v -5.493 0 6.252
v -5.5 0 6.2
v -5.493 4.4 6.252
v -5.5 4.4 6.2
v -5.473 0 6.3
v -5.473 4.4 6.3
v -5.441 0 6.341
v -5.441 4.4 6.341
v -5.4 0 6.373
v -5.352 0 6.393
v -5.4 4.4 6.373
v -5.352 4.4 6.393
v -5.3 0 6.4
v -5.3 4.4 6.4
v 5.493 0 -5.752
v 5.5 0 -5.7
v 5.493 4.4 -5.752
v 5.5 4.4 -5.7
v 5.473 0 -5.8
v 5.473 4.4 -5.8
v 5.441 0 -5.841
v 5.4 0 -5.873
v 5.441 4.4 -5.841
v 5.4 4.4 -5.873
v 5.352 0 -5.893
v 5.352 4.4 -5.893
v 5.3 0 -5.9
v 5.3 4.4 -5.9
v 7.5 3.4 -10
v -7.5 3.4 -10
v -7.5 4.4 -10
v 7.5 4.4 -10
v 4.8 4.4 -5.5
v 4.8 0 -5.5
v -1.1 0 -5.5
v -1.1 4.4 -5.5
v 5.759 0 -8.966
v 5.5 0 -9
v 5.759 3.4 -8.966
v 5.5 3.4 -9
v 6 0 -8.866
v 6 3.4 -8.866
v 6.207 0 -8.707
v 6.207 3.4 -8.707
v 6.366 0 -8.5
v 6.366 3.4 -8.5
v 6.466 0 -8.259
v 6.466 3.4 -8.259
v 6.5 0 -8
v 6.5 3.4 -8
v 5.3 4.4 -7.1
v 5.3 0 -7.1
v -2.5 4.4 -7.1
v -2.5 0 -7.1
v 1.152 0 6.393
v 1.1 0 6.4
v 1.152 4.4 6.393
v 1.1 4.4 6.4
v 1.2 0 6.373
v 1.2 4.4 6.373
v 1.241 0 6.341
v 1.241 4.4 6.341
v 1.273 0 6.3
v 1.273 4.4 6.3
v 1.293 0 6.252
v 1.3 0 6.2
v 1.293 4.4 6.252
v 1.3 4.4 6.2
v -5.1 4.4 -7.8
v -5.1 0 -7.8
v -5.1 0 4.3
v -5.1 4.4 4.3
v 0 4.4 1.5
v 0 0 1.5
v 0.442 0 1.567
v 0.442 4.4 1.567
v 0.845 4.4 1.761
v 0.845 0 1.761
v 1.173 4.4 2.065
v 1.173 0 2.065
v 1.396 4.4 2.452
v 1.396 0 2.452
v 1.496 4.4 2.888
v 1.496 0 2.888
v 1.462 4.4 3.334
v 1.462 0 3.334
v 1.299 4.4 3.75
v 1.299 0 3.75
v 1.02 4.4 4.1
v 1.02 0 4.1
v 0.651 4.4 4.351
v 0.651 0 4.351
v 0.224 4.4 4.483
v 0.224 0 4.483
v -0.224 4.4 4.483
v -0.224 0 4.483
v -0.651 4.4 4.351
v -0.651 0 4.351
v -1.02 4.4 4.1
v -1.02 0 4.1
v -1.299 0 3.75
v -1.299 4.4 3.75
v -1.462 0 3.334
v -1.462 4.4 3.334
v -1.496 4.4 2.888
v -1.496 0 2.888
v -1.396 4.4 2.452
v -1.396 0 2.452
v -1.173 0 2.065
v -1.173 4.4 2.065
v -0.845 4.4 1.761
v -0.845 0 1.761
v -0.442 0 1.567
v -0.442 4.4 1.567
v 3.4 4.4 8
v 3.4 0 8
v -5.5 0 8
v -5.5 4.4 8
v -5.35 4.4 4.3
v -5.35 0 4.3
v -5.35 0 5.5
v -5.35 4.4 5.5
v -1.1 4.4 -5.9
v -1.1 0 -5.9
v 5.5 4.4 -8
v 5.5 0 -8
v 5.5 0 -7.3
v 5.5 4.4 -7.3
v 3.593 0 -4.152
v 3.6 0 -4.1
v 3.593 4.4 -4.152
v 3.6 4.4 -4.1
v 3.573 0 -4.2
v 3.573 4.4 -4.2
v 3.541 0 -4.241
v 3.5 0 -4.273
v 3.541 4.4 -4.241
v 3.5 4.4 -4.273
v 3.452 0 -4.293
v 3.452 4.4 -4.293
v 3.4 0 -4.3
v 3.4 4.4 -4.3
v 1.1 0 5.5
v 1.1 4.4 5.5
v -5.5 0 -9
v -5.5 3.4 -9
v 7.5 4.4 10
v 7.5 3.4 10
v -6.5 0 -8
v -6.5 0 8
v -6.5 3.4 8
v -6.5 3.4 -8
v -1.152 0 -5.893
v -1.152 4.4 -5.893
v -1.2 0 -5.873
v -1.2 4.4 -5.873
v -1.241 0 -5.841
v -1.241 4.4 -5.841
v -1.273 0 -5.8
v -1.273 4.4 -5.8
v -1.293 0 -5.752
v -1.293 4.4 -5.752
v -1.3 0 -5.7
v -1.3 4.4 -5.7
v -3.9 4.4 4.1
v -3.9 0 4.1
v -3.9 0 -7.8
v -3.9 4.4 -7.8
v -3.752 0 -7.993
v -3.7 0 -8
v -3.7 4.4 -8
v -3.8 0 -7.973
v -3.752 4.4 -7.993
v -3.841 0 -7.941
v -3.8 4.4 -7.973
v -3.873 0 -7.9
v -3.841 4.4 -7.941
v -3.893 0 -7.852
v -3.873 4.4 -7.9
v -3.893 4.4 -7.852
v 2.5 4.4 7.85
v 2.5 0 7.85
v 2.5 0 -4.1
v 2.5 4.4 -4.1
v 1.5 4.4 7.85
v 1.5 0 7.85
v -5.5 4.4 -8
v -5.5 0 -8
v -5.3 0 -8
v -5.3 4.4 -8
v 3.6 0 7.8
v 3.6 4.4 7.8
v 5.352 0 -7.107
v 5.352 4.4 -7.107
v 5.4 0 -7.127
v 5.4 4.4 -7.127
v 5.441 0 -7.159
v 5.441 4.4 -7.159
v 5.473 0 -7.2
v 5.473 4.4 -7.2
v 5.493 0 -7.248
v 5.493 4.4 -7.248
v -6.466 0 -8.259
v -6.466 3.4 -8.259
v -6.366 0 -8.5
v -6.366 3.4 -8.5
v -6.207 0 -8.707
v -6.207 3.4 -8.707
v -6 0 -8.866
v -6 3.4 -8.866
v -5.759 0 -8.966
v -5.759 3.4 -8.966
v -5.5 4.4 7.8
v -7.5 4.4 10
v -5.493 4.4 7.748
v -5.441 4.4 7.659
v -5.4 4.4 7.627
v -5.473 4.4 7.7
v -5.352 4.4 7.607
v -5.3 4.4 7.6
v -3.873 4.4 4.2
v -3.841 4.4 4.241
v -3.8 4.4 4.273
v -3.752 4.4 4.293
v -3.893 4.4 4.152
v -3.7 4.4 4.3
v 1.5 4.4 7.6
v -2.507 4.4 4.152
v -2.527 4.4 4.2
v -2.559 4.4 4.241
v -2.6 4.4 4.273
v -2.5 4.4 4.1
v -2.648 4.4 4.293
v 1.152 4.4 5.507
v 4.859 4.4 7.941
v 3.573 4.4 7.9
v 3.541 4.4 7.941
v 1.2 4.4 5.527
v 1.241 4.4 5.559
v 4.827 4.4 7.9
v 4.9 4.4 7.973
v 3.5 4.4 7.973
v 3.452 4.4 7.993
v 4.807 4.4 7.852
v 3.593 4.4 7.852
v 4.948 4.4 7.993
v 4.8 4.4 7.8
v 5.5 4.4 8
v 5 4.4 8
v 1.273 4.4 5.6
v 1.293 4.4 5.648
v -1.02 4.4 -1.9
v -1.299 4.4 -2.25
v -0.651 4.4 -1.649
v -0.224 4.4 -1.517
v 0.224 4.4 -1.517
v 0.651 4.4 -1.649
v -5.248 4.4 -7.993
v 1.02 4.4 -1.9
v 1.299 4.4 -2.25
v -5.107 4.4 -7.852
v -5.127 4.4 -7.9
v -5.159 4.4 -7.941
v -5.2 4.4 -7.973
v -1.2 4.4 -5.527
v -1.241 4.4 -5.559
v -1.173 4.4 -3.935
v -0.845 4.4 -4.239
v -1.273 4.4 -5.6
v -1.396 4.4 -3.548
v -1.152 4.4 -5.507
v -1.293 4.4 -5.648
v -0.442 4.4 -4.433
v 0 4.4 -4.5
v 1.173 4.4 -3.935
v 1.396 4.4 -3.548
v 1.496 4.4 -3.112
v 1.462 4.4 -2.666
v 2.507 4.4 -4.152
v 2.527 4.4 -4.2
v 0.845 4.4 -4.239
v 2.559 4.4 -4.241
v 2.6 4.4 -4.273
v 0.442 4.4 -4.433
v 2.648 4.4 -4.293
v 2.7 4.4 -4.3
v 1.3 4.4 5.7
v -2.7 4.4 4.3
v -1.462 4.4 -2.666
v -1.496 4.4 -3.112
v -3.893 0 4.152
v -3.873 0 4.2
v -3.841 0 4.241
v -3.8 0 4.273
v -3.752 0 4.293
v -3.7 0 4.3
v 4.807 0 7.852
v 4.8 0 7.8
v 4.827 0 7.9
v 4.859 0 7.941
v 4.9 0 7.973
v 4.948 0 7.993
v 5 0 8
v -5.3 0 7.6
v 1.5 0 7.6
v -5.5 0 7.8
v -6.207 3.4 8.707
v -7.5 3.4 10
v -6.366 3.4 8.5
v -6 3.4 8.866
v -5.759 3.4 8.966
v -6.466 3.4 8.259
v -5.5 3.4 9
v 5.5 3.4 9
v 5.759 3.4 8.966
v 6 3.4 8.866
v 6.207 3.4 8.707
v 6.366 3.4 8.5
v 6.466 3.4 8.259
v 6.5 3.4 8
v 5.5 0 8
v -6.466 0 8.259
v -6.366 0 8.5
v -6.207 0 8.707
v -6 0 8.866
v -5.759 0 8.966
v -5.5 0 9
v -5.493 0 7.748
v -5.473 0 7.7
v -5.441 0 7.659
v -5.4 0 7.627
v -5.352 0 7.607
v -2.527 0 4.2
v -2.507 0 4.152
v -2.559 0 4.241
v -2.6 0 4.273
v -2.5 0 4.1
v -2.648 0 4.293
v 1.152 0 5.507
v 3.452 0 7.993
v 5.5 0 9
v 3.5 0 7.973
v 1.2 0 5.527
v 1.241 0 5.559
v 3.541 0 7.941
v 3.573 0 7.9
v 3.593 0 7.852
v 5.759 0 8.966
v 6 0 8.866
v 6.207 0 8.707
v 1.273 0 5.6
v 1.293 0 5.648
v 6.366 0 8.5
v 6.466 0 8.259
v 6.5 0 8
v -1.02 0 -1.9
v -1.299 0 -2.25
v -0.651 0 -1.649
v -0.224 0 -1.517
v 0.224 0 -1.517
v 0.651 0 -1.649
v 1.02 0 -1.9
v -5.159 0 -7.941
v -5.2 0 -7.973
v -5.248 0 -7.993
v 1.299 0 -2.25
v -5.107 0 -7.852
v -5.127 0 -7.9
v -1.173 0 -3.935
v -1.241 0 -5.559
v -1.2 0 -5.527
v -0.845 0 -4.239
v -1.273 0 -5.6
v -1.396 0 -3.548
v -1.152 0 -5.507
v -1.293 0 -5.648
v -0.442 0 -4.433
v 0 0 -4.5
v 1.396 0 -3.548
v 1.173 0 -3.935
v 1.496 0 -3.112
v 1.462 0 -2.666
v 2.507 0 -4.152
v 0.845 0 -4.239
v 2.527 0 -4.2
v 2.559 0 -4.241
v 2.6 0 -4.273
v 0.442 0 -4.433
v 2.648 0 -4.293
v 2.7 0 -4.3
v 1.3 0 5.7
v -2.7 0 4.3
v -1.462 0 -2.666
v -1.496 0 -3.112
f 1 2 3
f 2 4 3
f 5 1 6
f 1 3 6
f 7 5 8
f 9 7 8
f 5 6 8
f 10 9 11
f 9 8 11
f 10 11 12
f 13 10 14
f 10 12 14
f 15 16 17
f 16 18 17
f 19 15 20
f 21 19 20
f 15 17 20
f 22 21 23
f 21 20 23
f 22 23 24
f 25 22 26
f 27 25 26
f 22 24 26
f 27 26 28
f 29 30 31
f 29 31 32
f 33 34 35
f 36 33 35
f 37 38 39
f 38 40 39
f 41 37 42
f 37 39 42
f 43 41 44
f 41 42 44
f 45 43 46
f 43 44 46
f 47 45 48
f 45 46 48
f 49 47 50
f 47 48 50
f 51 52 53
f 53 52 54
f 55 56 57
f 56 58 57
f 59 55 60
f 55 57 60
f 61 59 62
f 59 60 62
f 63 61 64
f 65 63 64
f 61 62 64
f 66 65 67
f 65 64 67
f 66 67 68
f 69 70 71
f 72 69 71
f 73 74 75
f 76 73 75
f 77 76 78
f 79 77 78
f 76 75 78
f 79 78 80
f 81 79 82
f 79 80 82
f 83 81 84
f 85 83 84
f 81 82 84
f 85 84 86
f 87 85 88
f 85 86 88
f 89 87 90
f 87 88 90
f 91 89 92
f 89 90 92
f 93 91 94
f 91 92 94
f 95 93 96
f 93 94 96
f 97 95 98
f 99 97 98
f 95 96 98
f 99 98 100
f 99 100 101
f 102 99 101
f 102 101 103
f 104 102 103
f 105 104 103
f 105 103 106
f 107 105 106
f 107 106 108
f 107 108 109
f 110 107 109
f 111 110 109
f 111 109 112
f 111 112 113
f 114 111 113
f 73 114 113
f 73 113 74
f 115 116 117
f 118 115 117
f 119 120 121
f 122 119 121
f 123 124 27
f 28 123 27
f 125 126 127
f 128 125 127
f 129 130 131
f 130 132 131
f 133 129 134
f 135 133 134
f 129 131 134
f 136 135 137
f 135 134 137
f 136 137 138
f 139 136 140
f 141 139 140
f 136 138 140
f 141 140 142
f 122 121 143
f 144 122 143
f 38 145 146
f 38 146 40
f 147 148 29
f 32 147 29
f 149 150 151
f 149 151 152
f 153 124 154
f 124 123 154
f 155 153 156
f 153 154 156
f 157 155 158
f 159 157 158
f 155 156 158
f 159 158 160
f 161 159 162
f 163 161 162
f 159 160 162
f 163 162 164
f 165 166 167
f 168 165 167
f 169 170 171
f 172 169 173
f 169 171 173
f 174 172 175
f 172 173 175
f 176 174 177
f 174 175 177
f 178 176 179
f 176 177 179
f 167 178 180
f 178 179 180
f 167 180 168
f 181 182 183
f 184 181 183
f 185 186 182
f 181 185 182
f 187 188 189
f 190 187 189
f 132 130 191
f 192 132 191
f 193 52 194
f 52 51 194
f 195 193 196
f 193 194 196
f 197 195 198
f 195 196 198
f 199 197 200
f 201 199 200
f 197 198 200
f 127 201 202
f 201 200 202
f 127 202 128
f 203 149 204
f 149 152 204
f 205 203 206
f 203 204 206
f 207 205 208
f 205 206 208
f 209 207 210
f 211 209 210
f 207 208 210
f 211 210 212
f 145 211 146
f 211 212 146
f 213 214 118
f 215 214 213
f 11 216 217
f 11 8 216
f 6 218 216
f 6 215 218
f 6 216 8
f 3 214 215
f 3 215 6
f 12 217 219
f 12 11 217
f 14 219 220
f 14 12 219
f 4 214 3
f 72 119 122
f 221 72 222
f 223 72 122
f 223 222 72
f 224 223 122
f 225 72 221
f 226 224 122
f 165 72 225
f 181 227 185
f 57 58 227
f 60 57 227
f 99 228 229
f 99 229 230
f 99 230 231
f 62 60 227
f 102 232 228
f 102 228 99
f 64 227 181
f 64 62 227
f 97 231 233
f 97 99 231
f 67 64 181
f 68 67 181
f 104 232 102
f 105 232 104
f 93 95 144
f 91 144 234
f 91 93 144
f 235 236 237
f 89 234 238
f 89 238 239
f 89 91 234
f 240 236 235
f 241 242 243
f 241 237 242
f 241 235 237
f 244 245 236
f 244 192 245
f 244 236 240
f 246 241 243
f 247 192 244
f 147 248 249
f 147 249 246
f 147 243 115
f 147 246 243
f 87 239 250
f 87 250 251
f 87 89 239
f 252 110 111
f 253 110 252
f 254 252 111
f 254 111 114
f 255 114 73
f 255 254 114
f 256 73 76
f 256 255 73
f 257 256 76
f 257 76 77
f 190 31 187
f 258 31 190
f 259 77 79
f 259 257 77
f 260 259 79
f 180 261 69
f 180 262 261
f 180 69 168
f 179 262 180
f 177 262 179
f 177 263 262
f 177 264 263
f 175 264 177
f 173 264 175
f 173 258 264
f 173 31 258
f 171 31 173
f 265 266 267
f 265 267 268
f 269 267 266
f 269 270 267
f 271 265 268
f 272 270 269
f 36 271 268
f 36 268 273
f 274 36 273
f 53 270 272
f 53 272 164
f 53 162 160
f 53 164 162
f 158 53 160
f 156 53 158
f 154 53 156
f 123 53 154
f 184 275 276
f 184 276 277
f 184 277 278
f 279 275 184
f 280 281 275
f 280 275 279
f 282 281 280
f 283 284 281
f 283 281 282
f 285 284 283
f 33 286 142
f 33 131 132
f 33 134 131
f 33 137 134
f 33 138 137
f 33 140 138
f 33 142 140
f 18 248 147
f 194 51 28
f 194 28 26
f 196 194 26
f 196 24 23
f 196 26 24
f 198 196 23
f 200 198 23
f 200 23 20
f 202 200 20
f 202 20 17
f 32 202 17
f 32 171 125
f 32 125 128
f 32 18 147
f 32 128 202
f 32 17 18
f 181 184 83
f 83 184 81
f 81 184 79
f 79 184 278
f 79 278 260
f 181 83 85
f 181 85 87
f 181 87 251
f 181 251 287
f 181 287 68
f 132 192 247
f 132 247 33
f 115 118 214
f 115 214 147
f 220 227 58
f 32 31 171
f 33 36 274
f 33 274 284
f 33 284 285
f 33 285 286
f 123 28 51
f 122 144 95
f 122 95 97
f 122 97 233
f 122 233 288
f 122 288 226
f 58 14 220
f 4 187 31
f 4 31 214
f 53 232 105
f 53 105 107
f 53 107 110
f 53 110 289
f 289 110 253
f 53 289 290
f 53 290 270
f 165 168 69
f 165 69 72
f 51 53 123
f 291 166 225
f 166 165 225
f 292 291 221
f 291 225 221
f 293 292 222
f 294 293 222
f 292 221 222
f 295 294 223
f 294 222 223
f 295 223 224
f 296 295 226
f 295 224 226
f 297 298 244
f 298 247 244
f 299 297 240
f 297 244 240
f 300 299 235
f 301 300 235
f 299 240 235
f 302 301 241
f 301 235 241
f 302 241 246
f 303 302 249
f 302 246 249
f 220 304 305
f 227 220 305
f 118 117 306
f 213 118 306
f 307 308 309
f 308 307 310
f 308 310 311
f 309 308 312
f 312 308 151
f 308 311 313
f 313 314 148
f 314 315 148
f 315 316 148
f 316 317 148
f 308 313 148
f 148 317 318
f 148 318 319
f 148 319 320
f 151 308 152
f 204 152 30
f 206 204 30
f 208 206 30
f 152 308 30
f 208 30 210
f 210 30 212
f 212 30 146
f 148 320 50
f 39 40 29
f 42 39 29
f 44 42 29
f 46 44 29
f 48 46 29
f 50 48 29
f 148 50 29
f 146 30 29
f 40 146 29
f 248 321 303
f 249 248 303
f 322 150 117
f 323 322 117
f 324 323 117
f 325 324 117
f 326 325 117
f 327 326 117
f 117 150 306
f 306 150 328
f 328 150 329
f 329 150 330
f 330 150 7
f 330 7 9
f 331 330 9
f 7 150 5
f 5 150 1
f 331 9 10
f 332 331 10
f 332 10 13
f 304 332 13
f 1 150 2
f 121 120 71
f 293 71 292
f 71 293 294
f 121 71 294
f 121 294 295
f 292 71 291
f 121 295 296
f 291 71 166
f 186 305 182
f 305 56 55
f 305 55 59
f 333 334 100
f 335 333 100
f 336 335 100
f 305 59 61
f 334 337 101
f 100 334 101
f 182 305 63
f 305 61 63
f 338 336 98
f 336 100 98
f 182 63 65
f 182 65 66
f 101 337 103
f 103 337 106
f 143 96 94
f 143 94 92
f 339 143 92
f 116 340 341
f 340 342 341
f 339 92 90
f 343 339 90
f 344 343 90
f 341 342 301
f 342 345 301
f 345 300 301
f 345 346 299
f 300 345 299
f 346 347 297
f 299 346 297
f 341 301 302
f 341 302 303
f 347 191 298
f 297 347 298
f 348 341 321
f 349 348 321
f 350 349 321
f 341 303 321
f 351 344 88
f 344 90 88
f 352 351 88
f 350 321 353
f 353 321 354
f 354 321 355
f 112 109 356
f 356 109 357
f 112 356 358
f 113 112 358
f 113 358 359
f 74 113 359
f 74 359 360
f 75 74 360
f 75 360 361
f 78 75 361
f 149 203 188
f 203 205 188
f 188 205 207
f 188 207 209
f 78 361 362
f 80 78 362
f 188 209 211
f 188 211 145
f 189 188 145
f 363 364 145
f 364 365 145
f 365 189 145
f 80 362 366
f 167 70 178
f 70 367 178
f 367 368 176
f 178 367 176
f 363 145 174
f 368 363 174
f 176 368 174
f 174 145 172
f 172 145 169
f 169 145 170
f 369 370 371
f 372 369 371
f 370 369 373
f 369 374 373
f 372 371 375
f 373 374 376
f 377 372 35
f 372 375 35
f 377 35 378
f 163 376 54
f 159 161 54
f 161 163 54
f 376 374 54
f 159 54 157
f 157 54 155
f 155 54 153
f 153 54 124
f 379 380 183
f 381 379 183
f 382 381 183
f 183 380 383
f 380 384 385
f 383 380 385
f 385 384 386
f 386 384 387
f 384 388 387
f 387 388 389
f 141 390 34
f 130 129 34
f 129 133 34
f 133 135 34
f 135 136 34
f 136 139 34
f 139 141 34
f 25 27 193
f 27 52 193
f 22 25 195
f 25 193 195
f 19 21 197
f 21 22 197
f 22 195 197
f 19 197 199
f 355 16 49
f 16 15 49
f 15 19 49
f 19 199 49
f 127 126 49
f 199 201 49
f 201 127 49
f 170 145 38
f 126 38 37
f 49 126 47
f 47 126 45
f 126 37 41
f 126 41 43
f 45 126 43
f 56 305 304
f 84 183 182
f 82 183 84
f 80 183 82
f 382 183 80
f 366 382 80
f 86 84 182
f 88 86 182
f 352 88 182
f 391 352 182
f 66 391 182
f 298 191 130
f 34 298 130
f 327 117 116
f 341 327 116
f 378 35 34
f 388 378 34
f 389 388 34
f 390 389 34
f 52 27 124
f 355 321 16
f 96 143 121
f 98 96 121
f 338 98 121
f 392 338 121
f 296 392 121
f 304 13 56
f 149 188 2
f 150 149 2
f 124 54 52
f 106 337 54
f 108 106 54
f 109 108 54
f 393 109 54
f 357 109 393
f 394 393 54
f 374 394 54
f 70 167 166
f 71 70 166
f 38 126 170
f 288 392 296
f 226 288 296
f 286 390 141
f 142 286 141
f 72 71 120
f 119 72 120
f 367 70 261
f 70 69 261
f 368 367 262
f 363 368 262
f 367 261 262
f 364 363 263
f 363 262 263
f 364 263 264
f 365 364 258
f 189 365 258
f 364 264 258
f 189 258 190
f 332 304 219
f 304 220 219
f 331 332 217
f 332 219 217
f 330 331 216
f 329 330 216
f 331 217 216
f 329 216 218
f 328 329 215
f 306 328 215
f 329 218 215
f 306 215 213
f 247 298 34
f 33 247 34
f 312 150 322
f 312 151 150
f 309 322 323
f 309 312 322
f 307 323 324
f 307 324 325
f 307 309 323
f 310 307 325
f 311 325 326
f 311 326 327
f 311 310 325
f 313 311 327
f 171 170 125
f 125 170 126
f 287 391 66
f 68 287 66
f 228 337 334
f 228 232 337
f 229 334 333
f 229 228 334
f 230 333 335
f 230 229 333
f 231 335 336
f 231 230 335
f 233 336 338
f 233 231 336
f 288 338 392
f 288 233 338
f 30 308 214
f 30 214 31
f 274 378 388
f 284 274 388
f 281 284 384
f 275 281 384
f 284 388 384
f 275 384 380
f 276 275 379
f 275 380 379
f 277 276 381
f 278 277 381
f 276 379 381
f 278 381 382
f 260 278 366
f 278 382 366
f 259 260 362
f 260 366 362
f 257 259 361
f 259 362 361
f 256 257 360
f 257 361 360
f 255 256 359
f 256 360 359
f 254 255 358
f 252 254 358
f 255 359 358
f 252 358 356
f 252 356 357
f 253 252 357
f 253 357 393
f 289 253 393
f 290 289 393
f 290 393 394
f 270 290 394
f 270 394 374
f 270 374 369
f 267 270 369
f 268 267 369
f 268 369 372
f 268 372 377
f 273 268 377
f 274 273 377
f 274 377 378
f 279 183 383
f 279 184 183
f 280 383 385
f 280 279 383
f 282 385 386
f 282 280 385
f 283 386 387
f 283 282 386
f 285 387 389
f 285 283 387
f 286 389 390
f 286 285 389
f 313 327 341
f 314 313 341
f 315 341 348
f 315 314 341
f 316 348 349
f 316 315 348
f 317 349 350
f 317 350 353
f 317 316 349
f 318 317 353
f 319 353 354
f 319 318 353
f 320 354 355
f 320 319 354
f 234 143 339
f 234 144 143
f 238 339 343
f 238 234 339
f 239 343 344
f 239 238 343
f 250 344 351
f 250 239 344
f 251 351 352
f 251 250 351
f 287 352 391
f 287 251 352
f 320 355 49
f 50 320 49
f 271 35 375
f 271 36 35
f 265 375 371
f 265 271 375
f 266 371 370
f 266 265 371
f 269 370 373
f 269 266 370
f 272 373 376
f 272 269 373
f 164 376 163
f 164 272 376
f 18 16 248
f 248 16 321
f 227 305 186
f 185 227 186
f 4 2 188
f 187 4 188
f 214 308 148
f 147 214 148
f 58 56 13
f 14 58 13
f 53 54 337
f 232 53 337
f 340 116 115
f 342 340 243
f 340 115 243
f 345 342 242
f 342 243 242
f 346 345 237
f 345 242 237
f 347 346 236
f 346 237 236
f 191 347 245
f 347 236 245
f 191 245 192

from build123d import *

# Parameters (mm, degrees)
SKETCH1_W           = 13
SKETCH1_H           = 18
BOSS_EXTRUDE1_DEPTH = 3.4
SKETCH2_W           = 15
SKETCH2_H           = 20
BOSS_EXTRUDE2_DEPTH = 1
SKETCH3_R           = 1.5
CUT_EXTRUDE1_DEPTH  = 14.251792332
FILLET1_R           = 0.2
FILLET2_R           = 1


with BuildPart() as part:
    # Sketch1 → Boss-Extrude1 (new body)
    with BuildSketch(Plane(origin=(0, 0, 0), x_dir=(1, 0, 0), z_dir=(0, 1, 0))):
        Rectangle(SKETCH1_W, SKETCH1_H)
    extrude(amount=BOSS_EXTRUDE1_DEPTH)

    # Sketch2 → Boss-Extrude2 (add)
    with BuildSketch(Plane(origin=(0, 3.4, 0), x_dir=(1, 0, 0), z_dir=(0, 1, 0))):
        Rectangle(SKETCH2_W, SKETCH2_H)
    extrude(amount=BOSS_EXTRUDE2_DEPTH)

    # Sketch3 → Cut-Extrude1 (cut, through all)
    with BuildSketch(Plane.XZ):
        with Locations(Location((0, 3, 0), (0, 0, 270))):
            Circle(SKETCH3_R)
        with Locations(Location((0, -3, 0), (0, 0, 270))):
            Circle(SKETCH3_R)
        Polygon((4.8, -5.5), (-1.3, -5.5), (-1.3, -5.9), (5.5, -5.9), (5.5, 8), (4.8, 8), align=None)
        Polygon((2.5, 7.85), (2.5, -4.3), (3.6, -4.3), (3.6, 8), (-5.5, 8), (-5.5, 7.6), (1.5, 7.6), (1.5, 7.85), align=None)
        Polygon((-2.5, -7.1), (-2.5, 4.3), (-3.9, 4.3), (-3.9, -8), (5.5, -8), (5.5, -7.1), align=None)
        Polygon((-5.35, 5.5), (1.3, 5.5), (1.3, 6.4), (-5.5, 6.4), (-5.5, -8), (-5.1, -8), (-5.1, 4.3), (-5.35, 4.3), align=None)
    extrude(amount=-CUT_EXTRUDE1_DEPTH, mode=Mode.SUBTRACT)

    # Fillet1
    fillet1_edges = [part.edges().sort_by_distance(p)[0] for p in [
        (-5.1, 2.2, -8),
        (-3.9, 2.2, -8),
        (-5.5, 2.2, 6.4),
        (-5.5, 2.2, 7.6),
        (4.8, 2.2, 8),
        (3.6, 2.2, 8),
        (-3.9, 2.2, 4.3),
        (-2.5, 2.2, 4.3),
        (1.3, 2.2, 5.5),
        (1.3, 2.2, 6.4),
        (5.5, 2.2, -7.1),
        (5.5, 2.2, -5.9),
        (-1.3, 2.2, -5.9),
        (-1.3, 2.2, -5.5),
        (3.6, 2.2, -4.3),
        (2.5, 2.2, -4.3),
    ]]
    fillet(fillet1_edges, radius=FILLET1_R - 0.0001)  # a hair under: the kernel refuses the full size

    # Fillet2
    fillet2_edges = [part.edges().sort_by_distance(p)[0] for p in [
        (6.5, 1.7, 9),
        (-6.5, 1.7, 9),
        (-6.5, 1.7, -9),
        (6.5, 1.7, -9),
    ]]
    fillet(fillet2_edges, radius=FILLET2_R)


solid = part.part
